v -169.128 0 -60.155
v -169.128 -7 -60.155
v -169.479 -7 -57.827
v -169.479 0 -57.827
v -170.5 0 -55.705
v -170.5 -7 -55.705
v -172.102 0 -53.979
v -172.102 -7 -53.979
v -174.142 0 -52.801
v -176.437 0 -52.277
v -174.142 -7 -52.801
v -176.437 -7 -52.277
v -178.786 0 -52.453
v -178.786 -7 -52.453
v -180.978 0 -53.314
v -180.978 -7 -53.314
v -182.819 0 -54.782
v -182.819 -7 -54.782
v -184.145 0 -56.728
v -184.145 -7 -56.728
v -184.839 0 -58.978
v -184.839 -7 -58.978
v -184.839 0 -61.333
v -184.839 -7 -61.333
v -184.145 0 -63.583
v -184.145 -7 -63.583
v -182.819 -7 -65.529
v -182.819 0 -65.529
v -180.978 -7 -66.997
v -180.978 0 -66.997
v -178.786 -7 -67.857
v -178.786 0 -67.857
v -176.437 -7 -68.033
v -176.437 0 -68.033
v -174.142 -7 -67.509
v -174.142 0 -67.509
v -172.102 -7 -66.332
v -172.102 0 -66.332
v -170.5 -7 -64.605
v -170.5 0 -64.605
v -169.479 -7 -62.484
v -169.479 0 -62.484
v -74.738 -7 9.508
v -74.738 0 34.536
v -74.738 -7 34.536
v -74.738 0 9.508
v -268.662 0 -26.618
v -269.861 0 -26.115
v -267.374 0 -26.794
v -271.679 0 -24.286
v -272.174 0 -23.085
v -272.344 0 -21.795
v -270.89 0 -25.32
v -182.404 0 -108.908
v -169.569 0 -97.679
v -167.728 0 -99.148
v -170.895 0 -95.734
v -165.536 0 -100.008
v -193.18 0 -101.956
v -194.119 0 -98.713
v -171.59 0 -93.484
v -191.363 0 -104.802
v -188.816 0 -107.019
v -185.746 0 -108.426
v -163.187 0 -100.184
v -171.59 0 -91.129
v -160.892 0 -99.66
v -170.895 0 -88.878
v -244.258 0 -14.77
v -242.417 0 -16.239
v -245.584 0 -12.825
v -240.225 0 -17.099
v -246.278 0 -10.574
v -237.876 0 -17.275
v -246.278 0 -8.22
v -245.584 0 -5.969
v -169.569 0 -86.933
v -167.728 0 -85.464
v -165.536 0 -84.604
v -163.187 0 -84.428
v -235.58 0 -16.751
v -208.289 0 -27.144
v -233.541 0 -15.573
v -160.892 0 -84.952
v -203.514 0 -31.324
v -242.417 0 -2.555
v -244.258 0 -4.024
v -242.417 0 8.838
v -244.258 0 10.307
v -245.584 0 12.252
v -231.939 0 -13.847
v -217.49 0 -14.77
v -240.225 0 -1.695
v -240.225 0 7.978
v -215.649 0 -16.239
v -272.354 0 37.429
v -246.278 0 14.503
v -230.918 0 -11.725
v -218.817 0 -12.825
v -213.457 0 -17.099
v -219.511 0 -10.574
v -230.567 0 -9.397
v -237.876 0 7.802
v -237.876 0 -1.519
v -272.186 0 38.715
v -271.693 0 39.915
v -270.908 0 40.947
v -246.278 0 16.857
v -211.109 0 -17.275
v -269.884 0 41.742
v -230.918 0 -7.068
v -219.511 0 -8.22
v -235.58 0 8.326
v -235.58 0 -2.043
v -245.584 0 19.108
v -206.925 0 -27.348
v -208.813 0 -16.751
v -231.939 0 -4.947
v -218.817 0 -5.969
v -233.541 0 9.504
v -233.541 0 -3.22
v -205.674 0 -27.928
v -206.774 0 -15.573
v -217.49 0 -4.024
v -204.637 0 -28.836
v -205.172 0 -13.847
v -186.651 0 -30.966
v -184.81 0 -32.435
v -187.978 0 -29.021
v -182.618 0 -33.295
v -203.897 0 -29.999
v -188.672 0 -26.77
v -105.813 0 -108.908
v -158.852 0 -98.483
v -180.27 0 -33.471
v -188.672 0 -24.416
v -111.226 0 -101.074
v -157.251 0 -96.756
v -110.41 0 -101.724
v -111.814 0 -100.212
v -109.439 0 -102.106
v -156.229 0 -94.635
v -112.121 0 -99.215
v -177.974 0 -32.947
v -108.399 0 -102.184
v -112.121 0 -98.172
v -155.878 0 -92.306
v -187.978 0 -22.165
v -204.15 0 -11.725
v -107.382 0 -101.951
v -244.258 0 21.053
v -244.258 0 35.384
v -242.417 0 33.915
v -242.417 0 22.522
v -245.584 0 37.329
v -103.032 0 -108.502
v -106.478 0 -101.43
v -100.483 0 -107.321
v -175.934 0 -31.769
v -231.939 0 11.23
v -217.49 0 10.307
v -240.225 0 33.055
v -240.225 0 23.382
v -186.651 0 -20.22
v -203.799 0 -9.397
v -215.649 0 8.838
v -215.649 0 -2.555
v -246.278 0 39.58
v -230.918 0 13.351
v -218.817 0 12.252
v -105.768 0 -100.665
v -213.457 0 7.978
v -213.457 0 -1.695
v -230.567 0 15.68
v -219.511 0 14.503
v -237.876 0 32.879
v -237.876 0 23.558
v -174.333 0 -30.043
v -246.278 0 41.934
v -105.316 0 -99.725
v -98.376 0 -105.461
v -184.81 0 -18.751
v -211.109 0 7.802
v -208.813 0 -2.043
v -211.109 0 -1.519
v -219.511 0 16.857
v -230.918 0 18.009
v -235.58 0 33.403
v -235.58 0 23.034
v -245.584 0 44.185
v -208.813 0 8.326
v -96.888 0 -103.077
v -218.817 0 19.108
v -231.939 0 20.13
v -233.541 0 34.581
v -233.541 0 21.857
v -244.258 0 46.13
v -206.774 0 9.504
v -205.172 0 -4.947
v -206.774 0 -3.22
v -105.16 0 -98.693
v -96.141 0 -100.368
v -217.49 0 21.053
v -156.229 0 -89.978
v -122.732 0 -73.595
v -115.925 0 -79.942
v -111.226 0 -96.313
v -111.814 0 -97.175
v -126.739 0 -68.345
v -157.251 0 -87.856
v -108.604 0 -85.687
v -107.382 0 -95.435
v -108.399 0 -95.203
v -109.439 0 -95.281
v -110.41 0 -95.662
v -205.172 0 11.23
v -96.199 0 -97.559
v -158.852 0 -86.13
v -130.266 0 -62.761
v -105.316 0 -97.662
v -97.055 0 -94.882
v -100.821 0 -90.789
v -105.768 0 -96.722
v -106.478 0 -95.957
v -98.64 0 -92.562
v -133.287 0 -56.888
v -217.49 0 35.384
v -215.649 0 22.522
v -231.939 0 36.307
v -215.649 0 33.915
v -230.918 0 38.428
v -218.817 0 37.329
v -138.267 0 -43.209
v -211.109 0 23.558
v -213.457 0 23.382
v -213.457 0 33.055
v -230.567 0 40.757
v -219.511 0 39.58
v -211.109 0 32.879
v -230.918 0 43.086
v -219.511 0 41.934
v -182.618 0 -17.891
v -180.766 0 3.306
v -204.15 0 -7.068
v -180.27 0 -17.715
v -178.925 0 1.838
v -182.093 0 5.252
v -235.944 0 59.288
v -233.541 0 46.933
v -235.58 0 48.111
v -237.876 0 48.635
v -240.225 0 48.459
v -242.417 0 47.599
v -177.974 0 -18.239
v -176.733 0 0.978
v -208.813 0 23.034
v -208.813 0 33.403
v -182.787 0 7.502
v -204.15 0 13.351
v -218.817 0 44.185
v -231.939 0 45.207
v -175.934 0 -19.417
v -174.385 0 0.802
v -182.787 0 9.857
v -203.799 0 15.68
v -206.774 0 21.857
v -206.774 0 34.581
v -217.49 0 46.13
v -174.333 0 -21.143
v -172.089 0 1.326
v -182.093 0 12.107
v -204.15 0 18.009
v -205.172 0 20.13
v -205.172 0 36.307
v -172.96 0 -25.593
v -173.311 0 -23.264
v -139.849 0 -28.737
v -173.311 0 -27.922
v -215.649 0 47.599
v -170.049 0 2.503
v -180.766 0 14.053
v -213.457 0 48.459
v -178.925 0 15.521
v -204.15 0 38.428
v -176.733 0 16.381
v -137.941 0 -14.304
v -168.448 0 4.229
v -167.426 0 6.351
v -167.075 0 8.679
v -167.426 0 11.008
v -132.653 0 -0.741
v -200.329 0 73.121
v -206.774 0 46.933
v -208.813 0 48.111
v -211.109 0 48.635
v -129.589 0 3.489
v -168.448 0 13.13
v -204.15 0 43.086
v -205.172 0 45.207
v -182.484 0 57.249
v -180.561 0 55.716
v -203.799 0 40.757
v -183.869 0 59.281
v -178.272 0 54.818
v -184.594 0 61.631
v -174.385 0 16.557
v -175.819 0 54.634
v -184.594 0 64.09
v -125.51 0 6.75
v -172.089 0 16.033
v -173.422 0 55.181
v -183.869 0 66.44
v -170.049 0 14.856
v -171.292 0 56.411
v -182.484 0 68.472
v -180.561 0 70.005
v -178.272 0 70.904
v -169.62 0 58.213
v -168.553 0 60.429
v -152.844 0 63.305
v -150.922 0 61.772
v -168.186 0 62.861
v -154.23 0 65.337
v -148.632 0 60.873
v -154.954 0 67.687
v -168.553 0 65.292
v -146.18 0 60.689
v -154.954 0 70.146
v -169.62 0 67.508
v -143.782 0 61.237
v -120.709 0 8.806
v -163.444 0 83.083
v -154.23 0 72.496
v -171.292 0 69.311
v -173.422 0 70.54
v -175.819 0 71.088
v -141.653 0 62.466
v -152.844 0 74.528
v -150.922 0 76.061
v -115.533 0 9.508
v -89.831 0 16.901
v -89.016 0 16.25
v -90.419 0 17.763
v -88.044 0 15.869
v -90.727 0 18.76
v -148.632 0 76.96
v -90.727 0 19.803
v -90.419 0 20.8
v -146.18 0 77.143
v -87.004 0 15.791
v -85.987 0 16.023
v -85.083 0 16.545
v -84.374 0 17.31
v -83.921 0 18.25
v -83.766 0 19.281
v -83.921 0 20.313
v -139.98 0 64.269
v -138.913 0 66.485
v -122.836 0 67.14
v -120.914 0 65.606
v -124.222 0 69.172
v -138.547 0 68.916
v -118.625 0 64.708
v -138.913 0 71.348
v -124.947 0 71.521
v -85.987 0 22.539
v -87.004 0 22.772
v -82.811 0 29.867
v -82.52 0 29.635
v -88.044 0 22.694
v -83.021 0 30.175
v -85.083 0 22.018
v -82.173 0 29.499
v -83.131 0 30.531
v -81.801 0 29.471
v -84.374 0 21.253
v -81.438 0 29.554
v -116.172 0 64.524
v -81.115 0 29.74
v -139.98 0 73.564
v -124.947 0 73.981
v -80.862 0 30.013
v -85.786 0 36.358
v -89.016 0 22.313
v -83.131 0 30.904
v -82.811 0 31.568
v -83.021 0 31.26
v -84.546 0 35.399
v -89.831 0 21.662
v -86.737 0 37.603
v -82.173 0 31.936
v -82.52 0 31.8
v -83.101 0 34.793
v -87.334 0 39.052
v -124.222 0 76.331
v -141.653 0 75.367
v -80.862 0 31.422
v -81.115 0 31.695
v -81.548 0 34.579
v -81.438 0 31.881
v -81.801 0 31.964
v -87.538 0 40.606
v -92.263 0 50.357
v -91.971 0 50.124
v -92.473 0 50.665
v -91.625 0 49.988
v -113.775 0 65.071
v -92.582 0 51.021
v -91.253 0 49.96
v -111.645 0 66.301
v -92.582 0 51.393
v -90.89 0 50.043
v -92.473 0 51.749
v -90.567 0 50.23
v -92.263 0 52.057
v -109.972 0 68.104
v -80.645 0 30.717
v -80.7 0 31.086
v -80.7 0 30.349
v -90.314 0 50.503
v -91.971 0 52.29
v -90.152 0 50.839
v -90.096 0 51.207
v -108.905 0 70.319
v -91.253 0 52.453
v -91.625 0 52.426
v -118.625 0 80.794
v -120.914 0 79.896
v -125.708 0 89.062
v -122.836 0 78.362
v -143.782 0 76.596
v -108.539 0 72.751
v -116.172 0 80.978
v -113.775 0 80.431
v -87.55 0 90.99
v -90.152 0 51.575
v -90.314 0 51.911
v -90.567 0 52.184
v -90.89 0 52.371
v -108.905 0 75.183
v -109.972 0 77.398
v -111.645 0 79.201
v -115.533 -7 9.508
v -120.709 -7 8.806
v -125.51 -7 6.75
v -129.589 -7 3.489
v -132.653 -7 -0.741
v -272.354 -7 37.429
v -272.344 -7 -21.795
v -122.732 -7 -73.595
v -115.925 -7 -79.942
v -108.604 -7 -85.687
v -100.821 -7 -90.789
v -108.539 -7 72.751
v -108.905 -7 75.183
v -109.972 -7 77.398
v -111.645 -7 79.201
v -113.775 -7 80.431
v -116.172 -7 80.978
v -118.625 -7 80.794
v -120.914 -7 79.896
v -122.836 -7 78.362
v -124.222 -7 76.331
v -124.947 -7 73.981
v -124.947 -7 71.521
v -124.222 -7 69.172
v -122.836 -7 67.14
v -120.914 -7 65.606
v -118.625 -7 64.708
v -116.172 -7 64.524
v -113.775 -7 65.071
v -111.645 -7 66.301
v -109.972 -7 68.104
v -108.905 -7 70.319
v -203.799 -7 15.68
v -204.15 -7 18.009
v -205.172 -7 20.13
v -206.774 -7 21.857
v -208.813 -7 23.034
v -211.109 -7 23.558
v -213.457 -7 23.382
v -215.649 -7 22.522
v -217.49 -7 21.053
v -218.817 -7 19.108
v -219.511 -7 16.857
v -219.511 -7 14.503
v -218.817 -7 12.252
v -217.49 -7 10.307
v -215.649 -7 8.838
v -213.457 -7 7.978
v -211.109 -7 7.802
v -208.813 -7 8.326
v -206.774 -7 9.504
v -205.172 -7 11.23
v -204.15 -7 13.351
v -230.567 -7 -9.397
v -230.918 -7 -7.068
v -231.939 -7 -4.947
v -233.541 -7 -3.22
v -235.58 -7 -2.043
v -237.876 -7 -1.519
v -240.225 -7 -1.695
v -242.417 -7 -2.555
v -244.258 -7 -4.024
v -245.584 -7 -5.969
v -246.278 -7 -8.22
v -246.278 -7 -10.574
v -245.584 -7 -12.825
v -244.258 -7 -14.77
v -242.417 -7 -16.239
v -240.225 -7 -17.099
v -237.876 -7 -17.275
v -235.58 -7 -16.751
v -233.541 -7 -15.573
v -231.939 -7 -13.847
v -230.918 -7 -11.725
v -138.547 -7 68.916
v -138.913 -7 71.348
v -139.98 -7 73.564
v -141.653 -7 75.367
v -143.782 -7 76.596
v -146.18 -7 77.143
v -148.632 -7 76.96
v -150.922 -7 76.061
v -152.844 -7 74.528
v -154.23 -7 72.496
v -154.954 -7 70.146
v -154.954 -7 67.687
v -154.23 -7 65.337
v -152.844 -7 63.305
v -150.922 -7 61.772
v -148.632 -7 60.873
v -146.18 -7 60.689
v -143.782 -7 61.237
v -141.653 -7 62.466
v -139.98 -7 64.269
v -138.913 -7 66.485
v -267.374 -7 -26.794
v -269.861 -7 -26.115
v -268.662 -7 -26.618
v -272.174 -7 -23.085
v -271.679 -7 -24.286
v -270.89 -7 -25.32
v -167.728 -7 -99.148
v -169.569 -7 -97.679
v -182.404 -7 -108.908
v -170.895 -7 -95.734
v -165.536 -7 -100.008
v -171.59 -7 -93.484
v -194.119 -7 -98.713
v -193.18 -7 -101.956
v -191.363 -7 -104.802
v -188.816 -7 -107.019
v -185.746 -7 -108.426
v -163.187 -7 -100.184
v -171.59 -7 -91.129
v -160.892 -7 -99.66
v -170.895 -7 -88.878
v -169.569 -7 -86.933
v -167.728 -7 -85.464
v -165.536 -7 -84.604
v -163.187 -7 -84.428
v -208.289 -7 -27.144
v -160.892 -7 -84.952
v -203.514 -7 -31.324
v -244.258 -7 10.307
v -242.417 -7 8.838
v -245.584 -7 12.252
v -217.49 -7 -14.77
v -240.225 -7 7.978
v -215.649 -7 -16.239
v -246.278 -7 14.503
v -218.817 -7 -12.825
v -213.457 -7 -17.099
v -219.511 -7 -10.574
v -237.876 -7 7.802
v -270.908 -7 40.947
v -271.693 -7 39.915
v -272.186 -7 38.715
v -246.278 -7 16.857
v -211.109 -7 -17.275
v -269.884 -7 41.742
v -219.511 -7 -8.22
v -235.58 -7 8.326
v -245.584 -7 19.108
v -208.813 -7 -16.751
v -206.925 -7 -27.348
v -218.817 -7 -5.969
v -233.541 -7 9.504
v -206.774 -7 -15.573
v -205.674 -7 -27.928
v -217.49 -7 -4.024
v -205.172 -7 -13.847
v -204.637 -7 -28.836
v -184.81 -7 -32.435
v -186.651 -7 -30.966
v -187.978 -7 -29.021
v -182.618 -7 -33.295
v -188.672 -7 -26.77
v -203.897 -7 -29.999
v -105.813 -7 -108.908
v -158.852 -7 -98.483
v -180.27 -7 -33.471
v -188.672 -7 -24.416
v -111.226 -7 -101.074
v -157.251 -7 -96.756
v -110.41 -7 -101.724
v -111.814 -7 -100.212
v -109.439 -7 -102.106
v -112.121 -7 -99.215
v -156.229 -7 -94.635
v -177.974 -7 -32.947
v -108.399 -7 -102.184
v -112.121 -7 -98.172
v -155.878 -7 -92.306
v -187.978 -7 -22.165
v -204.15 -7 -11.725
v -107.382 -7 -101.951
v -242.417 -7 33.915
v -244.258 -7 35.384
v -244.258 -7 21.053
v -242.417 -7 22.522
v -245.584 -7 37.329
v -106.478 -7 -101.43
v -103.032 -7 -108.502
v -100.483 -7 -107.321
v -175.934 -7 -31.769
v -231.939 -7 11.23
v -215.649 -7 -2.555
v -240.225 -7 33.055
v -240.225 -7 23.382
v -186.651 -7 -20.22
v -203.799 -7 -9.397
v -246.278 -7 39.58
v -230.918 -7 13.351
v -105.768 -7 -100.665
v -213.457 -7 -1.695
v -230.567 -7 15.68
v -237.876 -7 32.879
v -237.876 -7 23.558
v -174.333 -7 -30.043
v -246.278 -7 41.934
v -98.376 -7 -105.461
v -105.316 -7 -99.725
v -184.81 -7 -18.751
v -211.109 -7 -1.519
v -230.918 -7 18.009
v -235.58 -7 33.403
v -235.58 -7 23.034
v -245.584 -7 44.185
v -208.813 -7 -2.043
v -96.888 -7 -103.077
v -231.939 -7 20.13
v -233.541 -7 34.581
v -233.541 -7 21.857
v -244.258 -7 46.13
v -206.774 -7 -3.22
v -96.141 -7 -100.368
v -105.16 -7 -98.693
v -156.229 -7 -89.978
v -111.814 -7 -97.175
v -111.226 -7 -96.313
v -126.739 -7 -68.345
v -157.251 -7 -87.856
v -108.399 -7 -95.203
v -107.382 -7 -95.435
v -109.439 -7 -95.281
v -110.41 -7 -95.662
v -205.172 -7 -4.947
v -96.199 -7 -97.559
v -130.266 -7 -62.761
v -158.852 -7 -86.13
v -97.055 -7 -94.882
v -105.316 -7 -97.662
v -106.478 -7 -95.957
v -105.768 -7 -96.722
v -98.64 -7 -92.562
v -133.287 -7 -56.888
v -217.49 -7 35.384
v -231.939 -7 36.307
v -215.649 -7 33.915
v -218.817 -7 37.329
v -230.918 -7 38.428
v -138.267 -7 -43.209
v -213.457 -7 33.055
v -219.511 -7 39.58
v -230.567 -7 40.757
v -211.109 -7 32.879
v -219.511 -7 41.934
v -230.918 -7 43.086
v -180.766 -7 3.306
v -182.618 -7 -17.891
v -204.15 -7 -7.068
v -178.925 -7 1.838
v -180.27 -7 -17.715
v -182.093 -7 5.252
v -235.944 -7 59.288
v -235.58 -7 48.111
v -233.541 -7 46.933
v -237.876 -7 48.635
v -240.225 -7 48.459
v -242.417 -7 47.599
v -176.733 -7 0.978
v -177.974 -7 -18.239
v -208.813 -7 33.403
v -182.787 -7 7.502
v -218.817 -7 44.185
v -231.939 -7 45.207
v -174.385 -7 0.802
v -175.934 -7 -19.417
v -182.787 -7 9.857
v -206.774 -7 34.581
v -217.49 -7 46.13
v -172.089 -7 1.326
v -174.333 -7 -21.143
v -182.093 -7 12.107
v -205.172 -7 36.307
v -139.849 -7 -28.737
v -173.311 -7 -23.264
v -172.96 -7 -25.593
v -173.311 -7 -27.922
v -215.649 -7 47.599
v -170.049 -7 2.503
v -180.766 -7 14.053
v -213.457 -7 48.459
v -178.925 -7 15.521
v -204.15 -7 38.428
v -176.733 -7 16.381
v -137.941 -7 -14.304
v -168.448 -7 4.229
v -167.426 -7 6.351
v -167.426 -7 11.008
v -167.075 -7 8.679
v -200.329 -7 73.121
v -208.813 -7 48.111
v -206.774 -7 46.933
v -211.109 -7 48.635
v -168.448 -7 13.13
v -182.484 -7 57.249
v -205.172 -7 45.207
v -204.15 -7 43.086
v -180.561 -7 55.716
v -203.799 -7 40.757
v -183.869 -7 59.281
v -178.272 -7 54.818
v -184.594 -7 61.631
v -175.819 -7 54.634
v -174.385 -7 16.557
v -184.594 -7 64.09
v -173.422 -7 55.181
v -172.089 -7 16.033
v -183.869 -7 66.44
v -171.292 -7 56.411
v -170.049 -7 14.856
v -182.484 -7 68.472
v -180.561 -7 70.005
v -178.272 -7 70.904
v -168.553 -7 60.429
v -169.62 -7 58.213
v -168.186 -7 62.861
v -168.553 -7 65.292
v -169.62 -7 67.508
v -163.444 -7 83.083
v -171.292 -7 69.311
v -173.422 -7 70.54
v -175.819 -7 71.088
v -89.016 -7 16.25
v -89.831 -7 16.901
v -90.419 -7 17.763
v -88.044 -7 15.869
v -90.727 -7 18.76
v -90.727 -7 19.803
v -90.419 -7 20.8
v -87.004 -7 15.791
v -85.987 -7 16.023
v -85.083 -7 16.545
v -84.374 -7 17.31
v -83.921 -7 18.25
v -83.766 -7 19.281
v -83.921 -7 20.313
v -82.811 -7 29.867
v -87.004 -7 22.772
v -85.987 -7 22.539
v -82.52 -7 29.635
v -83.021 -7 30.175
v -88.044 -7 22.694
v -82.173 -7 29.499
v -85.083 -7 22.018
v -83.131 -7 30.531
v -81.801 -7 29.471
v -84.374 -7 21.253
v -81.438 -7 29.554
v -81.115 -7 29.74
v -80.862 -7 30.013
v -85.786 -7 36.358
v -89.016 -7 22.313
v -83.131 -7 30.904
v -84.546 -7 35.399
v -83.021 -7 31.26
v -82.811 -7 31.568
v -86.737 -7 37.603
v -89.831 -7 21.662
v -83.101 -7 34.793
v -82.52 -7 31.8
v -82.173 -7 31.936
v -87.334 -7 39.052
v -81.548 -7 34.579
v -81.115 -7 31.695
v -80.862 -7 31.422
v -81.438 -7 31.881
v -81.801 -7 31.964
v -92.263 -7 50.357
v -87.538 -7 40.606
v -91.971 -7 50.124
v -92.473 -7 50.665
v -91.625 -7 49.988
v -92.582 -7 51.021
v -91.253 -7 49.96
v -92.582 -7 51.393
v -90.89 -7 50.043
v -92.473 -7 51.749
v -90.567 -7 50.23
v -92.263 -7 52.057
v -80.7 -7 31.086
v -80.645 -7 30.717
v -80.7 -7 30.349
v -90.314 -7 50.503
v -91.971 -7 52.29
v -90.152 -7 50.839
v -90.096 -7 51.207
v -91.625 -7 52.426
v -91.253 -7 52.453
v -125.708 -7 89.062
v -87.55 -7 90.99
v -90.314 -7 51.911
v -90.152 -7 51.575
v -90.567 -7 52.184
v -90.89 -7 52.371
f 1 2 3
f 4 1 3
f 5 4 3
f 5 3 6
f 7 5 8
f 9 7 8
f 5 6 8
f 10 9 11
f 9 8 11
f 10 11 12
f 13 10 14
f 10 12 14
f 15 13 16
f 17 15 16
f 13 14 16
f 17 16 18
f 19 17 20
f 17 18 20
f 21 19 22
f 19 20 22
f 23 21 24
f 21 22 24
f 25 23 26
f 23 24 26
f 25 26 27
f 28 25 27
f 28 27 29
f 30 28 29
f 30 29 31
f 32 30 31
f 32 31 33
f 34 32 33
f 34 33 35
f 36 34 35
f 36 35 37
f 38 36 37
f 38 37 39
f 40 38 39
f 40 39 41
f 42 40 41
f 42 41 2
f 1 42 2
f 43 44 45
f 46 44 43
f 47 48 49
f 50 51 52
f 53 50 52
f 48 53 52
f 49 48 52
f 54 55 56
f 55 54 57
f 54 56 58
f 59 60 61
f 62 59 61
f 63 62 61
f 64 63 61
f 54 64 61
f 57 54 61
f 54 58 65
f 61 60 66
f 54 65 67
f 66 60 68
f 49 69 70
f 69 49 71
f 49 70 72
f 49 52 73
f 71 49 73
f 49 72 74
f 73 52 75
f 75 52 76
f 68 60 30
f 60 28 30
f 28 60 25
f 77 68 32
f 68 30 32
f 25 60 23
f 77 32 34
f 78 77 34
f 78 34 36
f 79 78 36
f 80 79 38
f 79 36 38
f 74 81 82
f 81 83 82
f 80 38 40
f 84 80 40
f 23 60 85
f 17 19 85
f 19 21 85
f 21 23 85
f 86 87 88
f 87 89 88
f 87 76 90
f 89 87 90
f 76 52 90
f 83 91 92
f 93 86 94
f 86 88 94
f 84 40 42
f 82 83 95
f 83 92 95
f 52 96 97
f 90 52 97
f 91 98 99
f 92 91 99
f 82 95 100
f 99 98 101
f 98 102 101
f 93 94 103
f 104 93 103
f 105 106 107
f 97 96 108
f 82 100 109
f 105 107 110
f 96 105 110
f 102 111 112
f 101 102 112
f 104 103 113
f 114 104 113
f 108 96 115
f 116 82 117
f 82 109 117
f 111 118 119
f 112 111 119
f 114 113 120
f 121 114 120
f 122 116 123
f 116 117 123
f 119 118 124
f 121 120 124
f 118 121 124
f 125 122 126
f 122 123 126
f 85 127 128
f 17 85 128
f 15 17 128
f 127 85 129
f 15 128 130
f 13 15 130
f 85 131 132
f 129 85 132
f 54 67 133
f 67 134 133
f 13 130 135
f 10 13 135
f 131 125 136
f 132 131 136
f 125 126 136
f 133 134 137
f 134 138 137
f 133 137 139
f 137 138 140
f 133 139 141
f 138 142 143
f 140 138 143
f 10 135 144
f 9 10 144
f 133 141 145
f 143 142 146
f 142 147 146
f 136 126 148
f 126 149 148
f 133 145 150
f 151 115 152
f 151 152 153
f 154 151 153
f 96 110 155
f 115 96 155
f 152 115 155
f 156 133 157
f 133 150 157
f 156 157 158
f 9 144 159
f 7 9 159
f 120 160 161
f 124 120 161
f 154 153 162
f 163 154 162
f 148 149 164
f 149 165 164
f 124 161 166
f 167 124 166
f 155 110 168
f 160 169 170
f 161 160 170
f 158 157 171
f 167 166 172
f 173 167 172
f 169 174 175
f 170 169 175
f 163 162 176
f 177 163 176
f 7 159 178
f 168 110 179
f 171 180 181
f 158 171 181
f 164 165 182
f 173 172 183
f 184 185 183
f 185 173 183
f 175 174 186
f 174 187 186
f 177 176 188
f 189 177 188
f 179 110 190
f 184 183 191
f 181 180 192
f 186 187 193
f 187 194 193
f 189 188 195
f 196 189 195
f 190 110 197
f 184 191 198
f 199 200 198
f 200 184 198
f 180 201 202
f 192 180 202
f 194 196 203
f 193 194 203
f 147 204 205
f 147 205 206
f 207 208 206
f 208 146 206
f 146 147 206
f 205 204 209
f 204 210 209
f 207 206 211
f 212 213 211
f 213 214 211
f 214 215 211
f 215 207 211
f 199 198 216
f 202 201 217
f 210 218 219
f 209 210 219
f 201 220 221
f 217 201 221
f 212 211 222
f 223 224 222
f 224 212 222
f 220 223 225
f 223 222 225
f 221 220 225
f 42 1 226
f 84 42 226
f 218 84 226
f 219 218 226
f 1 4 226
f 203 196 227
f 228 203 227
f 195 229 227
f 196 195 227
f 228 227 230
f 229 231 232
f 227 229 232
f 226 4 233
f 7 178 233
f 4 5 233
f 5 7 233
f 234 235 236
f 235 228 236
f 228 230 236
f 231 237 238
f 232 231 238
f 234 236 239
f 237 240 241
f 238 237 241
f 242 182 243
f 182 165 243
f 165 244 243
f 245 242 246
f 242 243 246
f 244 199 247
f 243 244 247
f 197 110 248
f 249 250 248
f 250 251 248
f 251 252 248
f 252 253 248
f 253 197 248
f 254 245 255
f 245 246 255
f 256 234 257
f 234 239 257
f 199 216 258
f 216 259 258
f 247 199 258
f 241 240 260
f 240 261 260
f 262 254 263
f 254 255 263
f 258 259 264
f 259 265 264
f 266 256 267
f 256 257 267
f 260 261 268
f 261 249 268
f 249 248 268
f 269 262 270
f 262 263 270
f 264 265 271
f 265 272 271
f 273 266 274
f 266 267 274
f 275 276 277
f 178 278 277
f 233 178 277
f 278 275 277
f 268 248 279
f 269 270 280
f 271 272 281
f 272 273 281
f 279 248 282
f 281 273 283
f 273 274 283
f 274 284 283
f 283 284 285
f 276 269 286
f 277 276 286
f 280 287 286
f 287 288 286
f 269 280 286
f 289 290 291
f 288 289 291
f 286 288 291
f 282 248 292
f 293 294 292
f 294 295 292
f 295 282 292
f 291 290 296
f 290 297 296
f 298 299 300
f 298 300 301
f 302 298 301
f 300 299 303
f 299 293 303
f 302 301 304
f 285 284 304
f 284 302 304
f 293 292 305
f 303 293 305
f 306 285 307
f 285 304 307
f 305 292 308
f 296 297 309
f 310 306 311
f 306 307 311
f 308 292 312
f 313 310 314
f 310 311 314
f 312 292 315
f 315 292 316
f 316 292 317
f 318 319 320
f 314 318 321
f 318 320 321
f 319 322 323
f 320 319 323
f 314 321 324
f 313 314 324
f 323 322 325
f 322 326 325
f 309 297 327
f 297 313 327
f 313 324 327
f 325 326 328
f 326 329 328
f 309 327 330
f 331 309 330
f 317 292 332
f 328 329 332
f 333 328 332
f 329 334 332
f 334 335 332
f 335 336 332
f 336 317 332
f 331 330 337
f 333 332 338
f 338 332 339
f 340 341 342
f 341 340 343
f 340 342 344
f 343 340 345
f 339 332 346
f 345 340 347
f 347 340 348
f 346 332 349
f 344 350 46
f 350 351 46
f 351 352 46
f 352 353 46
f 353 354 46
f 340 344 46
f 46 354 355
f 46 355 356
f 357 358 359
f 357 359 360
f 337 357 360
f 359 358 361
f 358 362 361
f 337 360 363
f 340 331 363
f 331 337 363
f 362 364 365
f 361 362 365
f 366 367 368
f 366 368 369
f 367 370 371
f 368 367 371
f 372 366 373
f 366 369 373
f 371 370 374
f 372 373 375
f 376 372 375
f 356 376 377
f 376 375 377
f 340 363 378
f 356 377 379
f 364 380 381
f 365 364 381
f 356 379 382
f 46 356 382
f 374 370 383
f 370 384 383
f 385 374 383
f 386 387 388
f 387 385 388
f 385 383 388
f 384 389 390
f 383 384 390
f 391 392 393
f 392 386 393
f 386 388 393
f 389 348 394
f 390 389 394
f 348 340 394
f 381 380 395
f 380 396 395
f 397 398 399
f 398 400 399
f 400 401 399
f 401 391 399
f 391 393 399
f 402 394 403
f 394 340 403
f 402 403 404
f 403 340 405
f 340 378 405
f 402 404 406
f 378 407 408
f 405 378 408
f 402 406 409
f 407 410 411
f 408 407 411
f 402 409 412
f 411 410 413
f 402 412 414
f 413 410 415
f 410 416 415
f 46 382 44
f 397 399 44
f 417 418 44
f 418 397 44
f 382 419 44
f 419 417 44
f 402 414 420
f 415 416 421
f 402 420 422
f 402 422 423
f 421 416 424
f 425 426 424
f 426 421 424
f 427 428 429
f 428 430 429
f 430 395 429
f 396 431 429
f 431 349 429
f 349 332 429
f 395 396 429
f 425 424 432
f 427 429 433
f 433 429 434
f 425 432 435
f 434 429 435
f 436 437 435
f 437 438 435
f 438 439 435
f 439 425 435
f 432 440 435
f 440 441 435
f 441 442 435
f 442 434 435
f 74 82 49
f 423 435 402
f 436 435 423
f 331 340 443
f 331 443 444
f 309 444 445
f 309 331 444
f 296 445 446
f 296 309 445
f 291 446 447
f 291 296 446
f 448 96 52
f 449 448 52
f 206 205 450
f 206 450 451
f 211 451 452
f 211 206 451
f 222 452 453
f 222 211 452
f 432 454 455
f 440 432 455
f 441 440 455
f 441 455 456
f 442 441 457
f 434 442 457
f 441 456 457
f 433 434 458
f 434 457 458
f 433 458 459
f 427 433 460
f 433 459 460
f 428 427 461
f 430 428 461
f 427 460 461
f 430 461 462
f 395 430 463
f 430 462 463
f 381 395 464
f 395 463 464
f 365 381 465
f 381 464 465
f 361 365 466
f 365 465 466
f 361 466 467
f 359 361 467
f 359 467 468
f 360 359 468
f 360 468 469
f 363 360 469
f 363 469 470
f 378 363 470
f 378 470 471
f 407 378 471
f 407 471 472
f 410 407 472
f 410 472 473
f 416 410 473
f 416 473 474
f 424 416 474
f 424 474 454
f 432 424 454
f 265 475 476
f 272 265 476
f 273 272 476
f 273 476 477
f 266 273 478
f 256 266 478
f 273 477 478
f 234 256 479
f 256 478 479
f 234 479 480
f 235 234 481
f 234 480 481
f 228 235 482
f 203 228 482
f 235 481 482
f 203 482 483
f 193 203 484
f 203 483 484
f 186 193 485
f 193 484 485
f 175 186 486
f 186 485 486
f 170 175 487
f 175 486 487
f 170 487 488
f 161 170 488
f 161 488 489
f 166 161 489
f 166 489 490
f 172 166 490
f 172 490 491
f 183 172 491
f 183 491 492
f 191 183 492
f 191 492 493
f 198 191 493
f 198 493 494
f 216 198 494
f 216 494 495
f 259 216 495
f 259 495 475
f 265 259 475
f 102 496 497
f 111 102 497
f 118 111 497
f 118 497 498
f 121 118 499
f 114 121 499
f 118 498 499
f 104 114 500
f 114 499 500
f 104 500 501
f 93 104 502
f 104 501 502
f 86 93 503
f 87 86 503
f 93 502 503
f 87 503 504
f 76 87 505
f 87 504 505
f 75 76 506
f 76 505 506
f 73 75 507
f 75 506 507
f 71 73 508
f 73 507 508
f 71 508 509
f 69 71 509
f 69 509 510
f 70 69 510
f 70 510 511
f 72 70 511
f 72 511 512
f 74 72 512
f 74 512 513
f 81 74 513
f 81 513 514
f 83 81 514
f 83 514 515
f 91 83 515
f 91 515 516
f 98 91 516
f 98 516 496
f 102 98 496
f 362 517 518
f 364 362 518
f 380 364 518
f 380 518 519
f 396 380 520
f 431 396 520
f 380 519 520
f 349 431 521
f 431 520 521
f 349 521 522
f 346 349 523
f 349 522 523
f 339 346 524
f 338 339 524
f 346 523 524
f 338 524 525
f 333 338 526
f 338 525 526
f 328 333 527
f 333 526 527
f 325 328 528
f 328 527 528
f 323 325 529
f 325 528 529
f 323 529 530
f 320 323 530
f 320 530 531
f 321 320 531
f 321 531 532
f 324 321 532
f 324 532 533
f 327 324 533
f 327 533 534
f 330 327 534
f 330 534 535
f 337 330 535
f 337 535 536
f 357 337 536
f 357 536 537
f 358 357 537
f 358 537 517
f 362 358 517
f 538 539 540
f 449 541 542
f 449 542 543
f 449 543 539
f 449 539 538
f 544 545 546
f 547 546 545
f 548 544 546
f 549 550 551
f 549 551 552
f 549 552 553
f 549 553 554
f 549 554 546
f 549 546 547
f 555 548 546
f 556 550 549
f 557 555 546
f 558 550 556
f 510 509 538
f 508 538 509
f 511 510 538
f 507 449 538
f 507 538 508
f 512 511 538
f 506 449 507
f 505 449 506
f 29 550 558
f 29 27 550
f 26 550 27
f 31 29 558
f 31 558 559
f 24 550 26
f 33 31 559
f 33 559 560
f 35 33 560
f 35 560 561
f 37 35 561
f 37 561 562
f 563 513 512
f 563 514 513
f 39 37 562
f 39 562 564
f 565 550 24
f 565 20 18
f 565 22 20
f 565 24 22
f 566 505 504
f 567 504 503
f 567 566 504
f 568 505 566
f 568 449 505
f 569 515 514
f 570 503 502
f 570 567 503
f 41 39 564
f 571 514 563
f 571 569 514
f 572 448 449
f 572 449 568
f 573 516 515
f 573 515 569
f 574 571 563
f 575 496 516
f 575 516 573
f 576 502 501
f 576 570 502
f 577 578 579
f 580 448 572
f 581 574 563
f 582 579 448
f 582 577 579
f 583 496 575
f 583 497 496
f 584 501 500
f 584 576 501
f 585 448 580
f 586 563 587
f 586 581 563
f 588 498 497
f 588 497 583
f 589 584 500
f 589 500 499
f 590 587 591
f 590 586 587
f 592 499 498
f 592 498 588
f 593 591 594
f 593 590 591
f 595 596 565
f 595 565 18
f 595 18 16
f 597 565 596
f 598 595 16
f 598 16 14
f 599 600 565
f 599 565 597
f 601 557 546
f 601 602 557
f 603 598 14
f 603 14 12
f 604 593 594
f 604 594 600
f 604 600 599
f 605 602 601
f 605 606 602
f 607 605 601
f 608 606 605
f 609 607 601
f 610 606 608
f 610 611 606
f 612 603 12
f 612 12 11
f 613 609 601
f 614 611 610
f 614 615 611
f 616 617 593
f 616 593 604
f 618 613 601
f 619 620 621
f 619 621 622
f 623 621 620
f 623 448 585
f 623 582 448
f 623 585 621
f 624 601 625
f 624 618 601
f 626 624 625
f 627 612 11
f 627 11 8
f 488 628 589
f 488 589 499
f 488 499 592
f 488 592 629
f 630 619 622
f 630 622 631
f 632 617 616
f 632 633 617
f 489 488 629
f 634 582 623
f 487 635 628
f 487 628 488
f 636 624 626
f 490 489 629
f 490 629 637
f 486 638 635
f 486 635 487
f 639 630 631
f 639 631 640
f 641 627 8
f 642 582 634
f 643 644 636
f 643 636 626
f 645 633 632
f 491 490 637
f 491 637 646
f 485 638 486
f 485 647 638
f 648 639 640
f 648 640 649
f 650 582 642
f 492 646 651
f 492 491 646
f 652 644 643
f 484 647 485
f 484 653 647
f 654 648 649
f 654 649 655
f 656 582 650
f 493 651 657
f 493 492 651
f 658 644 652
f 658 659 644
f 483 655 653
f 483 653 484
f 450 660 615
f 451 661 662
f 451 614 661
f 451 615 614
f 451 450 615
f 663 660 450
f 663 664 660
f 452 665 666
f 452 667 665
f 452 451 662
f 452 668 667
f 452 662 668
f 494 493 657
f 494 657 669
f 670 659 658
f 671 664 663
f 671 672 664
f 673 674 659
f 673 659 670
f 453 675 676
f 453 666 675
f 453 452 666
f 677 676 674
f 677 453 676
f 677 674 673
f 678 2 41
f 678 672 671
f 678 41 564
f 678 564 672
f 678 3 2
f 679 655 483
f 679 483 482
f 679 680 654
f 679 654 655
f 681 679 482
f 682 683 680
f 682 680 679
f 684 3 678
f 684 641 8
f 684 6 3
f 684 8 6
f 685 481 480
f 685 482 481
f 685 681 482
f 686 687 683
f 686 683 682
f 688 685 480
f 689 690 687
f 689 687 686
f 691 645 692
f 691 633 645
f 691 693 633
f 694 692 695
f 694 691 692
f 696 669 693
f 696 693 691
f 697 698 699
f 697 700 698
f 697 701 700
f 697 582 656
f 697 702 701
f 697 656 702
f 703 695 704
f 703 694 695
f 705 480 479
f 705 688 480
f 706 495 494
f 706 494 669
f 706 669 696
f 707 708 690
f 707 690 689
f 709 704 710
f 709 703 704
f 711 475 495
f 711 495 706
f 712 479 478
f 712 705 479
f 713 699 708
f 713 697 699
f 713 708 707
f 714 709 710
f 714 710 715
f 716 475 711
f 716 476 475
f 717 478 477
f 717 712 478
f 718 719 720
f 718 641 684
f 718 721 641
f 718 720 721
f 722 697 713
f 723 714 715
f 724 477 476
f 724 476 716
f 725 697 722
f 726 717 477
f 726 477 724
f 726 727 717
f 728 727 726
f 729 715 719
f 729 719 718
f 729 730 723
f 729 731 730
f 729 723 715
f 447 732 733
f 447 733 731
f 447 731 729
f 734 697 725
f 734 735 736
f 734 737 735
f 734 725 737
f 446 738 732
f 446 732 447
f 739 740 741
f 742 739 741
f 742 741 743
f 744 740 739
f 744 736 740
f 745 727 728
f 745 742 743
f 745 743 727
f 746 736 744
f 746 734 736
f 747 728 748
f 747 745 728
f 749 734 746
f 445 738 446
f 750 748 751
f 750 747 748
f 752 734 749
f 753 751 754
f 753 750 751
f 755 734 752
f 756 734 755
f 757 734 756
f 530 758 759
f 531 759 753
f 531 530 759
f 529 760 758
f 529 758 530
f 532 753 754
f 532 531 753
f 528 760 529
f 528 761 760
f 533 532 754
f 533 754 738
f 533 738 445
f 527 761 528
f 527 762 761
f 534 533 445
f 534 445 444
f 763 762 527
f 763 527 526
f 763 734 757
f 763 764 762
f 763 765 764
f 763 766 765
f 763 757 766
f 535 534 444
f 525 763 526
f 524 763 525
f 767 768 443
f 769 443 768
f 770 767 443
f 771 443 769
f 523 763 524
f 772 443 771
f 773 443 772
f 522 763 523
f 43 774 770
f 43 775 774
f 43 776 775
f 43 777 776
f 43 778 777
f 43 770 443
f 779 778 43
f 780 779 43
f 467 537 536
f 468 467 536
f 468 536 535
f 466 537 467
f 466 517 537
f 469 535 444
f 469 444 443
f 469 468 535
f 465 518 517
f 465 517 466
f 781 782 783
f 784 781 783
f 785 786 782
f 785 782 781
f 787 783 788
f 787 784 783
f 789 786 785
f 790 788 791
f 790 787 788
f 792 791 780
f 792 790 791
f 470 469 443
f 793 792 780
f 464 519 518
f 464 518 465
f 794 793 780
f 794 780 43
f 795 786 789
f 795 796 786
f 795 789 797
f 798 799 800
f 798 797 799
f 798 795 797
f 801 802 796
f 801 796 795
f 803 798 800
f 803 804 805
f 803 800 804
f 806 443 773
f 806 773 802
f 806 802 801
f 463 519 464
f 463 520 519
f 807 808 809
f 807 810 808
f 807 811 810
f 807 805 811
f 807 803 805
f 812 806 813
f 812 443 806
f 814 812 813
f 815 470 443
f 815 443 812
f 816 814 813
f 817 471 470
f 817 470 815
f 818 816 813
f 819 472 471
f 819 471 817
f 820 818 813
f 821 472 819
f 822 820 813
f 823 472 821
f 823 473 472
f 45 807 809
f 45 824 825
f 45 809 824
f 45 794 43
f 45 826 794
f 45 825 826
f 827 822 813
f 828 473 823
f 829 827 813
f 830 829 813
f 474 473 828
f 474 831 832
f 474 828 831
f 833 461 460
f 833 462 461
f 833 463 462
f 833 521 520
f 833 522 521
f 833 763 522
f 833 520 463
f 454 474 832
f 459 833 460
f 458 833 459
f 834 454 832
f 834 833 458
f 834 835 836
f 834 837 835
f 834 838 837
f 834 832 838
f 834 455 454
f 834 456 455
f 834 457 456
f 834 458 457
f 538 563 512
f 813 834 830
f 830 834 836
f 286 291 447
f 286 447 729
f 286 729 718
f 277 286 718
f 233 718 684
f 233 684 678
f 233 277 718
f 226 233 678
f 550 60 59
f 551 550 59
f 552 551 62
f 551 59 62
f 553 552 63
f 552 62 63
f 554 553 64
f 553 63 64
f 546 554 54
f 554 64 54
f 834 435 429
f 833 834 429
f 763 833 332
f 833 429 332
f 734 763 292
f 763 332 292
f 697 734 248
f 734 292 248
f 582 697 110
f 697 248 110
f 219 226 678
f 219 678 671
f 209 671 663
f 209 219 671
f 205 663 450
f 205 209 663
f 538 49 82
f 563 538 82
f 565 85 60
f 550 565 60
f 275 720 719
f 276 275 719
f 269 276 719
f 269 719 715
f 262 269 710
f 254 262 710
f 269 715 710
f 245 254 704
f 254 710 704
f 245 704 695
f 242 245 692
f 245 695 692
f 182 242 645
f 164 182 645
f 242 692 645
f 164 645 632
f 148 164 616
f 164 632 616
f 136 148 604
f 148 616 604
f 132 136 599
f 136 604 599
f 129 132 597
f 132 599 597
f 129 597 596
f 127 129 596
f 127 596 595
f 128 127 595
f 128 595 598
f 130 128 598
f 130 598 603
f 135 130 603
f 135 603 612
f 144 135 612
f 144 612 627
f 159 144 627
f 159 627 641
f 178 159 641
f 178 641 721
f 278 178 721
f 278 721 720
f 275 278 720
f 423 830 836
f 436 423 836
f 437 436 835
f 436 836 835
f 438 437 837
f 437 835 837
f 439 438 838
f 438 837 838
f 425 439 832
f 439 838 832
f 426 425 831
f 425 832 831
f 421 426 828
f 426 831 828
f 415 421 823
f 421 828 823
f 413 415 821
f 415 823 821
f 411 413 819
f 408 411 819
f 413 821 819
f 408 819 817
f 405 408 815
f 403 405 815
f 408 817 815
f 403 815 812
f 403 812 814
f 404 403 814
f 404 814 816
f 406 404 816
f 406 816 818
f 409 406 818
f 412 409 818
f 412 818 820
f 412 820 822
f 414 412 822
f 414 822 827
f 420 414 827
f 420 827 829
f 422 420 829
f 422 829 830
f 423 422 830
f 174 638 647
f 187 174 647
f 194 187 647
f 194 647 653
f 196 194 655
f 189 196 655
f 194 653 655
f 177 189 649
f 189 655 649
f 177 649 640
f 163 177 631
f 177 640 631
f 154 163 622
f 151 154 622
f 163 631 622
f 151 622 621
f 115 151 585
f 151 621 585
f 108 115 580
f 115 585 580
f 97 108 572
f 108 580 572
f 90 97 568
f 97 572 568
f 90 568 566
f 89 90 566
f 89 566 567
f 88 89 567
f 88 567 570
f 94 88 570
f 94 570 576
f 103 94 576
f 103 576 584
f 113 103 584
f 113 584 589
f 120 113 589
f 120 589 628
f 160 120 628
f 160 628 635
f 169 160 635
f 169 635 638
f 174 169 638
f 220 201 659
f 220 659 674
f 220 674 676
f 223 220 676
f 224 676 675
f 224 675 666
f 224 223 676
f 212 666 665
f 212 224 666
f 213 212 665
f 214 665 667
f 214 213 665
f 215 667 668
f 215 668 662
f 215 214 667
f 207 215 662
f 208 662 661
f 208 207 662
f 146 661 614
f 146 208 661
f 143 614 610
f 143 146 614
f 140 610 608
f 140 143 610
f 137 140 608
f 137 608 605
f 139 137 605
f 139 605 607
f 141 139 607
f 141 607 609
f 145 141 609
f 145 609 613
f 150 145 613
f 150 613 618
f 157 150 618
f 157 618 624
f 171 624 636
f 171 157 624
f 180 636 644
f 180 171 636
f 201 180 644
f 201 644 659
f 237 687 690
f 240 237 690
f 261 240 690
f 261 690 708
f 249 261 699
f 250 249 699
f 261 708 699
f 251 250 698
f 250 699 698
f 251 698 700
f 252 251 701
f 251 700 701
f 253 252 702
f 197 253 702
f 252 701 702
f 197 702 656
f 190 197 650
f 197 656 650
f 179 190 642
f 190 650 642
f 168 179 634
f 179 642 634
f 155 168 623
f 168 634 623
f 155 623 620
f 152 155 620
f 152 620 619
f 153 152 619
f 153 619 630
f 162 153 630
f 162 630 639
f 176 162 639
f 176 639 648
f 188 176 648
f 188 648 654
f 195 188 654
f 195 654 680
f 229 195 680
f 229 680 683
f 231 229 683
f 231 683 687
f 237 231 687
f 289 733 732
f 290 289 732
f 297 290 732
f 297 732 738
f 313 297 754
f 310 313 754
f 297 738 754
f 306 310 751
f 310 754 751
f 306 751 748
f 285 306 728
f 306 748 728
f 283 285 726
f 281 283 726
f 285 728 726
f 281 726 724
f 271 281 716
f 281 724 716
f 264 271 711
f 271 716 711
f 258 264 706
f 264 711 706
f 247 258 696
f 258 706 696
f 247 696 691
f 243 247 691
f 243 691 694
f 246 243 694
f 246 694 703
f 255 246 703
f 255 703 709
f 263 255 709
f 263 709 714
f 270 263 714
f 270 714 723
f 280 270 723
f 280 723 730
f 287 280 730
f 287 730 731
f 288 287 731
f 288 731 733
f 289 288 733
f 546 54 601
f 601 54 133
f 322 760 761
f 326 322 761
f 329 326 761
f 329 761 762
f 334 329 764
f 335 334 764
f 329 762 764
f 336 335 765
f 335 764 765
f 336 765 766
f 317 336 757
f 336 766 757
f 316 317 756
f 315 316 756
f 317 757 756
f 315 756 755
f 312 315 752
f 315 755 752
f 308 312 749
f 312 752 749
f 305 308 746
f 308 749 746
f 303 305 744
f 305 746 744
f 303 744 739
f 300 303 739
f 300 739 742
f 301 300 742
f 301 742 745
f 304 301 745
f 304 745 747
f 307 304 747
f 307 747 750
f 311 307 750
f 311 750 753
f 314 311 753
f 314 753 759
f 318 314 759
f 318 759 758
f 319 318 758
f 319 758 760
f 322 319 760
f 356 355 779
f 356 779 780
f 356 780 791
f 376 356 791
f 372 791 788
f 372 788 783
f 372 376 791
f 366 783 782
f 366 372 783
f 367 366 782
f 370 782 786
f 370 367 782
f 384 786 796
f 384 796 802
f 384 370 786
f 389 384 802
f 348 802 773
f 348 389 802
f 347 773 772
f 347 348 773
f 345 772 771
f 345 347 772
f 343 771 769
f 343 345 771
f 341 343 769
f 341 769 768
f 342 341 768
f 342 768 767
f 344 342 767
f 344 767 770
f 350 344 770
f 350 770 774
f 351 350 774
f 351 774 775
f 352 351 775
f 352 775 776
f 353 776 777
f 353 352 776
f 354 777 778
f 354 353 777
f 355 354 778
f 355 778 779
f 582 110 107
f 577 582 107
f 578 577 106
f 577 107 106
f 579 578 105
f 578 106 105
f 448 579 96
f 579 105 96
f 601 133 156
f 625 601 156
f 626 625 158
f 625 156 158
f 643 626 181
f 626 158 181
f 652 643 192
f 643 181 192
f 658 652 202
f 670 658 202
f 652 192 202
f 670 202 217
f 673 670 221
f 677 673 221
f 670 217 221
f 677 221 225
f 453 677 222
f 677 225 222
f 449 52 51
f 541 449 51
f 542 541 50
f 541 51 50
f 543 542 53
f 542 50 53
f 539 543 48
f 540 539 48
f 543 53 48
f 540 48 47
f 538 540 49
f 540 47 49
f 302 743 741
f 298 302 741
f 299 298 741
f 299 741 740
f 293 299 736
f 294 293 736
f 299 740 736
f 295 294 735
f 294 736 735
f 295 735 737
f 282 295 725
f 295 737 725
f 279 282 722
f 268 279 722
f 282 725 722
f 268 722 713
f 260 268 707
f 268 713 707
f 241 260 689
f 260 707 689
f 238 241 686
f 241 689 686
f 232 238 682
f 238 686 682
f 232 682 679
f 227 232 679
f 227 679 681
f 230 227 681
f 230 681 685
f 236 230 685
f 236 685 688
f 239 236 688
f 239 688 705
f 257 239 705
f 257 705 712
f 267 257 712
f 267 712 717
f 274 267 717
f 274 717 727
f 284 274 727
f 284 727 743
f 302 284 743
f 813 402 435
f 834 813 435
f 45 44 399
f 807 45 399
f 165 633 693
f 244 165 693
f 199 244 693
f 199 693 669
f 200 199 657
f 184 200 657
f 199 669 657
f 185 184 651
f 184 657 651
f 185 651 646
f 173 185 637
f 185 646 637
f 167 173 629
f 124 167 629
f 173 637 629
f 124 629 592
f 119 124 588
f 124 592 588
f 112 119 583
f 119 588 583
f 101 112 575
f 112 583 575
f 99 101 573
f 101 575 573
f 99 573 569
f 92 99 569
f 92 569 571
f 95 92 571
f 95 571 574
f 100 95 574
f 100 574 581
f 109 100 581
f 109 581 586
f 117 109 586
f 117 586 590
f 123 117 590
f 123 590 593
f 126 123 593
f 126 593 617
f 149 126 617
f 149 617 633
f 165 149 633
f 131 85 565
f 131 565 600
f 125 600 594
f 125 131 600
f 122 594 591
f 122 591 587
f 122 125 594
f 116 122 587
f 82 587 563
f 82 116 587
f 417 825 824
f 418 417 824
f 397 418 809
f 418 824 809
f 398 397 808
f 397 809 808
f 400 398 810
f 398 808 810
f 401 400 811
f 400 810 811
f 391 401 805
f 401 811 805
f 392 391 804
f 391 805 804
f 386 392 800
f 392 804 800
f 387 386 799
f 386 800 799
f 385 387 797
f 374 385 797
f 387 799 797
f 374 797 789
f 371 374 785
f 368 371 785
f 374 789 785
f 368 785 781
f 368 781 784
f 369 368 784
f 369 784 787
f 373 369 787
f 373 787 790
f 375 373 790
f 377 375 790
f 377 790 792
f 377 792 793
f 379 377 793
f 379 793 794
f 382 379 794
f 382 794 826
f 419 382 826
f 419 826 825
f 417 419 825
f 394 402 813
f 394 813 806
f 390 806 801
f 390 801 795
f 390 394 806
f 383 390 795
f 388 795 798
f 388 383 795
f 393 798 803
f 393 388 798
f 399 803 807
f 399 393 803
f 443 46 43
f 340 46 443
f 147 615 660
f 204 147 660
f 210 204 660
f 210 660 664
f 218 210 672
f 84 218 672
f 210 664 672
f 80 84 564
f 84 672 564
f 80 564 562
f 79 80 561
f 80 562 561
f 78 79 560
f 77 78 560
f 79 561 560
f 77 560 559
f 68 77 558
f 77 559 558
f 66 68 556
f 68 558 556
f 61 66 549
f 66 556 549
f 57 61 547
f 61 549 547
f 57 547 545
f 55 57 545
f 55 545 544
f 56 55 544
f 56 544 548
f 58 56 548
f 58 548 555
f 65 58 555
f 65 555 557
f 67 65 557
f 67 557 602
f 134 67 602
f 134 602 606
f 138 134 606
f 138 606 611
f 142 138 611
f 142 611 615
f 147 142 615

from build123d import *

# Parameters (mm, degrees)
MIRROREDSKETCH_R      = 3.5
PAD022_DEPTH          = 7
MIRROREDSKETCH001_R   = 1.25
POCKET031_DEPTH       = 37.001
MIRROREDSKETCH002_R   = 7.9
MIRROREDSKETCH002_R_2 = 8.25
POCKET032_DEPTH       = 7.001


with BuildPart() as part:
    # MirroredSketch → Pad022 (new body)
    with BuildSketch(Plane.XZ):
        with BuildLine():
            Line((-272.354121, 37.429427), (-272.343757, -21.795436))
            ThreePointArc((-272.343757, -21.795436), (-270.889508, -25.319746), (-267.373614, -26.794228))
            Line((-267.373614, -26.794228), (-208.288633, -27.144182))
            ThreePointArc((-203.514267, -31.323983), (-205.122941, -28.344833), (-208.288633, -27.144182))
            Line((-203.514267, -31.323983), (-194.118707, -98.712795))
            ThreePointArc((-194.118707, -98.712795), (-190.168756, -106.001984), (-182.403958, -108.907549))
            Line((-182.403958, -108.907549), (-105.81311, -108.907549))
            ThreePointArc((-105.81311, -108.907549), (-96.416366, -101.749846), (-100.820682, -90.789302))
            ThreePointArc((-122.731662, -73.595005), (-112.325474, -82.892139), (-100.820682, -90.789302))
            ThreePointArc((-133.286541, -56.888144), (-128.564005, -65.592146), (-122.731662, -73.595005))
            ThreePointArc((-132.652743, -0.740873), (-139.8492, -28.736851), (-133.286541, -56.888144))
            ThreePointArc((-115.533318, 9.507899), (-125.509691, 6.749885), (-132.652743, -0.740873))
            Line((-74.738136, 9.507899), (-115.533318, 9.507899))
            Line((-74.738136, 34.5363), (-74.738136, 9.507899))
            Line((-74.738136, 34.5363), (-81.548261, 34.57921))
            ThreePointArc((-87.538437, 40.605923), (-85.785771, 36.357677), (-81.548261, 34.57921))
            Line((-87.538437, 40.605923), (-87.54951, 90.990038))
            ThreePointArc((-87.54951, 90.990038), (-182.019209, 78.593902), (-269.883601, 41.742351))
            ThreePointArc((-269.883601, 41.742351), (-271.692728, 39.91461), (-272.354121, 37.429427))
        make_face()
        with Locations((-87.265671, 19.281441)):
            Circle(MIRROREDSKETCH_R, mode=Mode.SUBTRACT)
        with Locations((-108.660279, -98.693397)):
            Circle(MIRROREDSKETCH_R, mode=Mode.SUBTRACT)
    extrude(amount=PAD022_DEPTH)

    # MirroredSketch001 → Pocket031 (cut, through all)
    with BuildSketch(Plane.XZ.offset(37)):
        with Locations((-81.894829, 30.717421)):
            Circle(MIRROREDSKETCH001_R)
        with Locations((-91.346397, 51.206974)):
            Circle(MIRROREDSKETCH001_R)
    extrude(amount=-POCKET031_DEPTH, mode=Mode.SUBTRACT)

    # MirroredSketch002 → Pocket032 (cut, through all)
    with BuildSketch(Plane.XZ.offset(7)):
        with Locations((-211.699159, 15.680032)):
            Circle(MIRROREDSKETCH002_R)
        with Locations((-211.699159, -9.396934)):
            Circle(MIRROREDSKETCH002_R)
        with Locations((-238.46666, 15.680032)):
            Circle(MIRROREDSKETCH002_R)
        with Locations((-238.46666, -9.396934)):
            Circle(MIRROREDSKETCH002_R)
        with Locations((-211.699159, 40.756998)):
            Circle(MIRROREDSKETCH002_R)
        with Locations((-238.46666, 40.756998)):
            Circle(MIRROREDSKETCH002_R)
        with Locations((-180.85994, -25.593019)):
            Circle(MIRROREDSKETCH002_R)
        with Locations((-177.027703, -60.155267)):
            Circle(MIRROREDSKETCH002_R)
        with Locations((-163.777795, -92.306084)):
            Circle(MIRROREDSKETCH002_R)
        with Locations((-174.975, 8.679456)):
            Circle(MIRROREDSKETCH002_R)
        with Locations((-116.788777, 72.751051)):
            Circle(MIRROREDSKETCH002_R_2)
        with Locations((-146.796527, 68.916422)):
            Circle(MIRROREDSKETCH002_R_2)
        with Locations((-176.435989, 62.860703)):
            Circle(MIRROREDSKETCH002_R_2)
    extrude(amount=-POCKET032_DEPTH, mode=Mode.SUBTRACT)


solid = part.part
